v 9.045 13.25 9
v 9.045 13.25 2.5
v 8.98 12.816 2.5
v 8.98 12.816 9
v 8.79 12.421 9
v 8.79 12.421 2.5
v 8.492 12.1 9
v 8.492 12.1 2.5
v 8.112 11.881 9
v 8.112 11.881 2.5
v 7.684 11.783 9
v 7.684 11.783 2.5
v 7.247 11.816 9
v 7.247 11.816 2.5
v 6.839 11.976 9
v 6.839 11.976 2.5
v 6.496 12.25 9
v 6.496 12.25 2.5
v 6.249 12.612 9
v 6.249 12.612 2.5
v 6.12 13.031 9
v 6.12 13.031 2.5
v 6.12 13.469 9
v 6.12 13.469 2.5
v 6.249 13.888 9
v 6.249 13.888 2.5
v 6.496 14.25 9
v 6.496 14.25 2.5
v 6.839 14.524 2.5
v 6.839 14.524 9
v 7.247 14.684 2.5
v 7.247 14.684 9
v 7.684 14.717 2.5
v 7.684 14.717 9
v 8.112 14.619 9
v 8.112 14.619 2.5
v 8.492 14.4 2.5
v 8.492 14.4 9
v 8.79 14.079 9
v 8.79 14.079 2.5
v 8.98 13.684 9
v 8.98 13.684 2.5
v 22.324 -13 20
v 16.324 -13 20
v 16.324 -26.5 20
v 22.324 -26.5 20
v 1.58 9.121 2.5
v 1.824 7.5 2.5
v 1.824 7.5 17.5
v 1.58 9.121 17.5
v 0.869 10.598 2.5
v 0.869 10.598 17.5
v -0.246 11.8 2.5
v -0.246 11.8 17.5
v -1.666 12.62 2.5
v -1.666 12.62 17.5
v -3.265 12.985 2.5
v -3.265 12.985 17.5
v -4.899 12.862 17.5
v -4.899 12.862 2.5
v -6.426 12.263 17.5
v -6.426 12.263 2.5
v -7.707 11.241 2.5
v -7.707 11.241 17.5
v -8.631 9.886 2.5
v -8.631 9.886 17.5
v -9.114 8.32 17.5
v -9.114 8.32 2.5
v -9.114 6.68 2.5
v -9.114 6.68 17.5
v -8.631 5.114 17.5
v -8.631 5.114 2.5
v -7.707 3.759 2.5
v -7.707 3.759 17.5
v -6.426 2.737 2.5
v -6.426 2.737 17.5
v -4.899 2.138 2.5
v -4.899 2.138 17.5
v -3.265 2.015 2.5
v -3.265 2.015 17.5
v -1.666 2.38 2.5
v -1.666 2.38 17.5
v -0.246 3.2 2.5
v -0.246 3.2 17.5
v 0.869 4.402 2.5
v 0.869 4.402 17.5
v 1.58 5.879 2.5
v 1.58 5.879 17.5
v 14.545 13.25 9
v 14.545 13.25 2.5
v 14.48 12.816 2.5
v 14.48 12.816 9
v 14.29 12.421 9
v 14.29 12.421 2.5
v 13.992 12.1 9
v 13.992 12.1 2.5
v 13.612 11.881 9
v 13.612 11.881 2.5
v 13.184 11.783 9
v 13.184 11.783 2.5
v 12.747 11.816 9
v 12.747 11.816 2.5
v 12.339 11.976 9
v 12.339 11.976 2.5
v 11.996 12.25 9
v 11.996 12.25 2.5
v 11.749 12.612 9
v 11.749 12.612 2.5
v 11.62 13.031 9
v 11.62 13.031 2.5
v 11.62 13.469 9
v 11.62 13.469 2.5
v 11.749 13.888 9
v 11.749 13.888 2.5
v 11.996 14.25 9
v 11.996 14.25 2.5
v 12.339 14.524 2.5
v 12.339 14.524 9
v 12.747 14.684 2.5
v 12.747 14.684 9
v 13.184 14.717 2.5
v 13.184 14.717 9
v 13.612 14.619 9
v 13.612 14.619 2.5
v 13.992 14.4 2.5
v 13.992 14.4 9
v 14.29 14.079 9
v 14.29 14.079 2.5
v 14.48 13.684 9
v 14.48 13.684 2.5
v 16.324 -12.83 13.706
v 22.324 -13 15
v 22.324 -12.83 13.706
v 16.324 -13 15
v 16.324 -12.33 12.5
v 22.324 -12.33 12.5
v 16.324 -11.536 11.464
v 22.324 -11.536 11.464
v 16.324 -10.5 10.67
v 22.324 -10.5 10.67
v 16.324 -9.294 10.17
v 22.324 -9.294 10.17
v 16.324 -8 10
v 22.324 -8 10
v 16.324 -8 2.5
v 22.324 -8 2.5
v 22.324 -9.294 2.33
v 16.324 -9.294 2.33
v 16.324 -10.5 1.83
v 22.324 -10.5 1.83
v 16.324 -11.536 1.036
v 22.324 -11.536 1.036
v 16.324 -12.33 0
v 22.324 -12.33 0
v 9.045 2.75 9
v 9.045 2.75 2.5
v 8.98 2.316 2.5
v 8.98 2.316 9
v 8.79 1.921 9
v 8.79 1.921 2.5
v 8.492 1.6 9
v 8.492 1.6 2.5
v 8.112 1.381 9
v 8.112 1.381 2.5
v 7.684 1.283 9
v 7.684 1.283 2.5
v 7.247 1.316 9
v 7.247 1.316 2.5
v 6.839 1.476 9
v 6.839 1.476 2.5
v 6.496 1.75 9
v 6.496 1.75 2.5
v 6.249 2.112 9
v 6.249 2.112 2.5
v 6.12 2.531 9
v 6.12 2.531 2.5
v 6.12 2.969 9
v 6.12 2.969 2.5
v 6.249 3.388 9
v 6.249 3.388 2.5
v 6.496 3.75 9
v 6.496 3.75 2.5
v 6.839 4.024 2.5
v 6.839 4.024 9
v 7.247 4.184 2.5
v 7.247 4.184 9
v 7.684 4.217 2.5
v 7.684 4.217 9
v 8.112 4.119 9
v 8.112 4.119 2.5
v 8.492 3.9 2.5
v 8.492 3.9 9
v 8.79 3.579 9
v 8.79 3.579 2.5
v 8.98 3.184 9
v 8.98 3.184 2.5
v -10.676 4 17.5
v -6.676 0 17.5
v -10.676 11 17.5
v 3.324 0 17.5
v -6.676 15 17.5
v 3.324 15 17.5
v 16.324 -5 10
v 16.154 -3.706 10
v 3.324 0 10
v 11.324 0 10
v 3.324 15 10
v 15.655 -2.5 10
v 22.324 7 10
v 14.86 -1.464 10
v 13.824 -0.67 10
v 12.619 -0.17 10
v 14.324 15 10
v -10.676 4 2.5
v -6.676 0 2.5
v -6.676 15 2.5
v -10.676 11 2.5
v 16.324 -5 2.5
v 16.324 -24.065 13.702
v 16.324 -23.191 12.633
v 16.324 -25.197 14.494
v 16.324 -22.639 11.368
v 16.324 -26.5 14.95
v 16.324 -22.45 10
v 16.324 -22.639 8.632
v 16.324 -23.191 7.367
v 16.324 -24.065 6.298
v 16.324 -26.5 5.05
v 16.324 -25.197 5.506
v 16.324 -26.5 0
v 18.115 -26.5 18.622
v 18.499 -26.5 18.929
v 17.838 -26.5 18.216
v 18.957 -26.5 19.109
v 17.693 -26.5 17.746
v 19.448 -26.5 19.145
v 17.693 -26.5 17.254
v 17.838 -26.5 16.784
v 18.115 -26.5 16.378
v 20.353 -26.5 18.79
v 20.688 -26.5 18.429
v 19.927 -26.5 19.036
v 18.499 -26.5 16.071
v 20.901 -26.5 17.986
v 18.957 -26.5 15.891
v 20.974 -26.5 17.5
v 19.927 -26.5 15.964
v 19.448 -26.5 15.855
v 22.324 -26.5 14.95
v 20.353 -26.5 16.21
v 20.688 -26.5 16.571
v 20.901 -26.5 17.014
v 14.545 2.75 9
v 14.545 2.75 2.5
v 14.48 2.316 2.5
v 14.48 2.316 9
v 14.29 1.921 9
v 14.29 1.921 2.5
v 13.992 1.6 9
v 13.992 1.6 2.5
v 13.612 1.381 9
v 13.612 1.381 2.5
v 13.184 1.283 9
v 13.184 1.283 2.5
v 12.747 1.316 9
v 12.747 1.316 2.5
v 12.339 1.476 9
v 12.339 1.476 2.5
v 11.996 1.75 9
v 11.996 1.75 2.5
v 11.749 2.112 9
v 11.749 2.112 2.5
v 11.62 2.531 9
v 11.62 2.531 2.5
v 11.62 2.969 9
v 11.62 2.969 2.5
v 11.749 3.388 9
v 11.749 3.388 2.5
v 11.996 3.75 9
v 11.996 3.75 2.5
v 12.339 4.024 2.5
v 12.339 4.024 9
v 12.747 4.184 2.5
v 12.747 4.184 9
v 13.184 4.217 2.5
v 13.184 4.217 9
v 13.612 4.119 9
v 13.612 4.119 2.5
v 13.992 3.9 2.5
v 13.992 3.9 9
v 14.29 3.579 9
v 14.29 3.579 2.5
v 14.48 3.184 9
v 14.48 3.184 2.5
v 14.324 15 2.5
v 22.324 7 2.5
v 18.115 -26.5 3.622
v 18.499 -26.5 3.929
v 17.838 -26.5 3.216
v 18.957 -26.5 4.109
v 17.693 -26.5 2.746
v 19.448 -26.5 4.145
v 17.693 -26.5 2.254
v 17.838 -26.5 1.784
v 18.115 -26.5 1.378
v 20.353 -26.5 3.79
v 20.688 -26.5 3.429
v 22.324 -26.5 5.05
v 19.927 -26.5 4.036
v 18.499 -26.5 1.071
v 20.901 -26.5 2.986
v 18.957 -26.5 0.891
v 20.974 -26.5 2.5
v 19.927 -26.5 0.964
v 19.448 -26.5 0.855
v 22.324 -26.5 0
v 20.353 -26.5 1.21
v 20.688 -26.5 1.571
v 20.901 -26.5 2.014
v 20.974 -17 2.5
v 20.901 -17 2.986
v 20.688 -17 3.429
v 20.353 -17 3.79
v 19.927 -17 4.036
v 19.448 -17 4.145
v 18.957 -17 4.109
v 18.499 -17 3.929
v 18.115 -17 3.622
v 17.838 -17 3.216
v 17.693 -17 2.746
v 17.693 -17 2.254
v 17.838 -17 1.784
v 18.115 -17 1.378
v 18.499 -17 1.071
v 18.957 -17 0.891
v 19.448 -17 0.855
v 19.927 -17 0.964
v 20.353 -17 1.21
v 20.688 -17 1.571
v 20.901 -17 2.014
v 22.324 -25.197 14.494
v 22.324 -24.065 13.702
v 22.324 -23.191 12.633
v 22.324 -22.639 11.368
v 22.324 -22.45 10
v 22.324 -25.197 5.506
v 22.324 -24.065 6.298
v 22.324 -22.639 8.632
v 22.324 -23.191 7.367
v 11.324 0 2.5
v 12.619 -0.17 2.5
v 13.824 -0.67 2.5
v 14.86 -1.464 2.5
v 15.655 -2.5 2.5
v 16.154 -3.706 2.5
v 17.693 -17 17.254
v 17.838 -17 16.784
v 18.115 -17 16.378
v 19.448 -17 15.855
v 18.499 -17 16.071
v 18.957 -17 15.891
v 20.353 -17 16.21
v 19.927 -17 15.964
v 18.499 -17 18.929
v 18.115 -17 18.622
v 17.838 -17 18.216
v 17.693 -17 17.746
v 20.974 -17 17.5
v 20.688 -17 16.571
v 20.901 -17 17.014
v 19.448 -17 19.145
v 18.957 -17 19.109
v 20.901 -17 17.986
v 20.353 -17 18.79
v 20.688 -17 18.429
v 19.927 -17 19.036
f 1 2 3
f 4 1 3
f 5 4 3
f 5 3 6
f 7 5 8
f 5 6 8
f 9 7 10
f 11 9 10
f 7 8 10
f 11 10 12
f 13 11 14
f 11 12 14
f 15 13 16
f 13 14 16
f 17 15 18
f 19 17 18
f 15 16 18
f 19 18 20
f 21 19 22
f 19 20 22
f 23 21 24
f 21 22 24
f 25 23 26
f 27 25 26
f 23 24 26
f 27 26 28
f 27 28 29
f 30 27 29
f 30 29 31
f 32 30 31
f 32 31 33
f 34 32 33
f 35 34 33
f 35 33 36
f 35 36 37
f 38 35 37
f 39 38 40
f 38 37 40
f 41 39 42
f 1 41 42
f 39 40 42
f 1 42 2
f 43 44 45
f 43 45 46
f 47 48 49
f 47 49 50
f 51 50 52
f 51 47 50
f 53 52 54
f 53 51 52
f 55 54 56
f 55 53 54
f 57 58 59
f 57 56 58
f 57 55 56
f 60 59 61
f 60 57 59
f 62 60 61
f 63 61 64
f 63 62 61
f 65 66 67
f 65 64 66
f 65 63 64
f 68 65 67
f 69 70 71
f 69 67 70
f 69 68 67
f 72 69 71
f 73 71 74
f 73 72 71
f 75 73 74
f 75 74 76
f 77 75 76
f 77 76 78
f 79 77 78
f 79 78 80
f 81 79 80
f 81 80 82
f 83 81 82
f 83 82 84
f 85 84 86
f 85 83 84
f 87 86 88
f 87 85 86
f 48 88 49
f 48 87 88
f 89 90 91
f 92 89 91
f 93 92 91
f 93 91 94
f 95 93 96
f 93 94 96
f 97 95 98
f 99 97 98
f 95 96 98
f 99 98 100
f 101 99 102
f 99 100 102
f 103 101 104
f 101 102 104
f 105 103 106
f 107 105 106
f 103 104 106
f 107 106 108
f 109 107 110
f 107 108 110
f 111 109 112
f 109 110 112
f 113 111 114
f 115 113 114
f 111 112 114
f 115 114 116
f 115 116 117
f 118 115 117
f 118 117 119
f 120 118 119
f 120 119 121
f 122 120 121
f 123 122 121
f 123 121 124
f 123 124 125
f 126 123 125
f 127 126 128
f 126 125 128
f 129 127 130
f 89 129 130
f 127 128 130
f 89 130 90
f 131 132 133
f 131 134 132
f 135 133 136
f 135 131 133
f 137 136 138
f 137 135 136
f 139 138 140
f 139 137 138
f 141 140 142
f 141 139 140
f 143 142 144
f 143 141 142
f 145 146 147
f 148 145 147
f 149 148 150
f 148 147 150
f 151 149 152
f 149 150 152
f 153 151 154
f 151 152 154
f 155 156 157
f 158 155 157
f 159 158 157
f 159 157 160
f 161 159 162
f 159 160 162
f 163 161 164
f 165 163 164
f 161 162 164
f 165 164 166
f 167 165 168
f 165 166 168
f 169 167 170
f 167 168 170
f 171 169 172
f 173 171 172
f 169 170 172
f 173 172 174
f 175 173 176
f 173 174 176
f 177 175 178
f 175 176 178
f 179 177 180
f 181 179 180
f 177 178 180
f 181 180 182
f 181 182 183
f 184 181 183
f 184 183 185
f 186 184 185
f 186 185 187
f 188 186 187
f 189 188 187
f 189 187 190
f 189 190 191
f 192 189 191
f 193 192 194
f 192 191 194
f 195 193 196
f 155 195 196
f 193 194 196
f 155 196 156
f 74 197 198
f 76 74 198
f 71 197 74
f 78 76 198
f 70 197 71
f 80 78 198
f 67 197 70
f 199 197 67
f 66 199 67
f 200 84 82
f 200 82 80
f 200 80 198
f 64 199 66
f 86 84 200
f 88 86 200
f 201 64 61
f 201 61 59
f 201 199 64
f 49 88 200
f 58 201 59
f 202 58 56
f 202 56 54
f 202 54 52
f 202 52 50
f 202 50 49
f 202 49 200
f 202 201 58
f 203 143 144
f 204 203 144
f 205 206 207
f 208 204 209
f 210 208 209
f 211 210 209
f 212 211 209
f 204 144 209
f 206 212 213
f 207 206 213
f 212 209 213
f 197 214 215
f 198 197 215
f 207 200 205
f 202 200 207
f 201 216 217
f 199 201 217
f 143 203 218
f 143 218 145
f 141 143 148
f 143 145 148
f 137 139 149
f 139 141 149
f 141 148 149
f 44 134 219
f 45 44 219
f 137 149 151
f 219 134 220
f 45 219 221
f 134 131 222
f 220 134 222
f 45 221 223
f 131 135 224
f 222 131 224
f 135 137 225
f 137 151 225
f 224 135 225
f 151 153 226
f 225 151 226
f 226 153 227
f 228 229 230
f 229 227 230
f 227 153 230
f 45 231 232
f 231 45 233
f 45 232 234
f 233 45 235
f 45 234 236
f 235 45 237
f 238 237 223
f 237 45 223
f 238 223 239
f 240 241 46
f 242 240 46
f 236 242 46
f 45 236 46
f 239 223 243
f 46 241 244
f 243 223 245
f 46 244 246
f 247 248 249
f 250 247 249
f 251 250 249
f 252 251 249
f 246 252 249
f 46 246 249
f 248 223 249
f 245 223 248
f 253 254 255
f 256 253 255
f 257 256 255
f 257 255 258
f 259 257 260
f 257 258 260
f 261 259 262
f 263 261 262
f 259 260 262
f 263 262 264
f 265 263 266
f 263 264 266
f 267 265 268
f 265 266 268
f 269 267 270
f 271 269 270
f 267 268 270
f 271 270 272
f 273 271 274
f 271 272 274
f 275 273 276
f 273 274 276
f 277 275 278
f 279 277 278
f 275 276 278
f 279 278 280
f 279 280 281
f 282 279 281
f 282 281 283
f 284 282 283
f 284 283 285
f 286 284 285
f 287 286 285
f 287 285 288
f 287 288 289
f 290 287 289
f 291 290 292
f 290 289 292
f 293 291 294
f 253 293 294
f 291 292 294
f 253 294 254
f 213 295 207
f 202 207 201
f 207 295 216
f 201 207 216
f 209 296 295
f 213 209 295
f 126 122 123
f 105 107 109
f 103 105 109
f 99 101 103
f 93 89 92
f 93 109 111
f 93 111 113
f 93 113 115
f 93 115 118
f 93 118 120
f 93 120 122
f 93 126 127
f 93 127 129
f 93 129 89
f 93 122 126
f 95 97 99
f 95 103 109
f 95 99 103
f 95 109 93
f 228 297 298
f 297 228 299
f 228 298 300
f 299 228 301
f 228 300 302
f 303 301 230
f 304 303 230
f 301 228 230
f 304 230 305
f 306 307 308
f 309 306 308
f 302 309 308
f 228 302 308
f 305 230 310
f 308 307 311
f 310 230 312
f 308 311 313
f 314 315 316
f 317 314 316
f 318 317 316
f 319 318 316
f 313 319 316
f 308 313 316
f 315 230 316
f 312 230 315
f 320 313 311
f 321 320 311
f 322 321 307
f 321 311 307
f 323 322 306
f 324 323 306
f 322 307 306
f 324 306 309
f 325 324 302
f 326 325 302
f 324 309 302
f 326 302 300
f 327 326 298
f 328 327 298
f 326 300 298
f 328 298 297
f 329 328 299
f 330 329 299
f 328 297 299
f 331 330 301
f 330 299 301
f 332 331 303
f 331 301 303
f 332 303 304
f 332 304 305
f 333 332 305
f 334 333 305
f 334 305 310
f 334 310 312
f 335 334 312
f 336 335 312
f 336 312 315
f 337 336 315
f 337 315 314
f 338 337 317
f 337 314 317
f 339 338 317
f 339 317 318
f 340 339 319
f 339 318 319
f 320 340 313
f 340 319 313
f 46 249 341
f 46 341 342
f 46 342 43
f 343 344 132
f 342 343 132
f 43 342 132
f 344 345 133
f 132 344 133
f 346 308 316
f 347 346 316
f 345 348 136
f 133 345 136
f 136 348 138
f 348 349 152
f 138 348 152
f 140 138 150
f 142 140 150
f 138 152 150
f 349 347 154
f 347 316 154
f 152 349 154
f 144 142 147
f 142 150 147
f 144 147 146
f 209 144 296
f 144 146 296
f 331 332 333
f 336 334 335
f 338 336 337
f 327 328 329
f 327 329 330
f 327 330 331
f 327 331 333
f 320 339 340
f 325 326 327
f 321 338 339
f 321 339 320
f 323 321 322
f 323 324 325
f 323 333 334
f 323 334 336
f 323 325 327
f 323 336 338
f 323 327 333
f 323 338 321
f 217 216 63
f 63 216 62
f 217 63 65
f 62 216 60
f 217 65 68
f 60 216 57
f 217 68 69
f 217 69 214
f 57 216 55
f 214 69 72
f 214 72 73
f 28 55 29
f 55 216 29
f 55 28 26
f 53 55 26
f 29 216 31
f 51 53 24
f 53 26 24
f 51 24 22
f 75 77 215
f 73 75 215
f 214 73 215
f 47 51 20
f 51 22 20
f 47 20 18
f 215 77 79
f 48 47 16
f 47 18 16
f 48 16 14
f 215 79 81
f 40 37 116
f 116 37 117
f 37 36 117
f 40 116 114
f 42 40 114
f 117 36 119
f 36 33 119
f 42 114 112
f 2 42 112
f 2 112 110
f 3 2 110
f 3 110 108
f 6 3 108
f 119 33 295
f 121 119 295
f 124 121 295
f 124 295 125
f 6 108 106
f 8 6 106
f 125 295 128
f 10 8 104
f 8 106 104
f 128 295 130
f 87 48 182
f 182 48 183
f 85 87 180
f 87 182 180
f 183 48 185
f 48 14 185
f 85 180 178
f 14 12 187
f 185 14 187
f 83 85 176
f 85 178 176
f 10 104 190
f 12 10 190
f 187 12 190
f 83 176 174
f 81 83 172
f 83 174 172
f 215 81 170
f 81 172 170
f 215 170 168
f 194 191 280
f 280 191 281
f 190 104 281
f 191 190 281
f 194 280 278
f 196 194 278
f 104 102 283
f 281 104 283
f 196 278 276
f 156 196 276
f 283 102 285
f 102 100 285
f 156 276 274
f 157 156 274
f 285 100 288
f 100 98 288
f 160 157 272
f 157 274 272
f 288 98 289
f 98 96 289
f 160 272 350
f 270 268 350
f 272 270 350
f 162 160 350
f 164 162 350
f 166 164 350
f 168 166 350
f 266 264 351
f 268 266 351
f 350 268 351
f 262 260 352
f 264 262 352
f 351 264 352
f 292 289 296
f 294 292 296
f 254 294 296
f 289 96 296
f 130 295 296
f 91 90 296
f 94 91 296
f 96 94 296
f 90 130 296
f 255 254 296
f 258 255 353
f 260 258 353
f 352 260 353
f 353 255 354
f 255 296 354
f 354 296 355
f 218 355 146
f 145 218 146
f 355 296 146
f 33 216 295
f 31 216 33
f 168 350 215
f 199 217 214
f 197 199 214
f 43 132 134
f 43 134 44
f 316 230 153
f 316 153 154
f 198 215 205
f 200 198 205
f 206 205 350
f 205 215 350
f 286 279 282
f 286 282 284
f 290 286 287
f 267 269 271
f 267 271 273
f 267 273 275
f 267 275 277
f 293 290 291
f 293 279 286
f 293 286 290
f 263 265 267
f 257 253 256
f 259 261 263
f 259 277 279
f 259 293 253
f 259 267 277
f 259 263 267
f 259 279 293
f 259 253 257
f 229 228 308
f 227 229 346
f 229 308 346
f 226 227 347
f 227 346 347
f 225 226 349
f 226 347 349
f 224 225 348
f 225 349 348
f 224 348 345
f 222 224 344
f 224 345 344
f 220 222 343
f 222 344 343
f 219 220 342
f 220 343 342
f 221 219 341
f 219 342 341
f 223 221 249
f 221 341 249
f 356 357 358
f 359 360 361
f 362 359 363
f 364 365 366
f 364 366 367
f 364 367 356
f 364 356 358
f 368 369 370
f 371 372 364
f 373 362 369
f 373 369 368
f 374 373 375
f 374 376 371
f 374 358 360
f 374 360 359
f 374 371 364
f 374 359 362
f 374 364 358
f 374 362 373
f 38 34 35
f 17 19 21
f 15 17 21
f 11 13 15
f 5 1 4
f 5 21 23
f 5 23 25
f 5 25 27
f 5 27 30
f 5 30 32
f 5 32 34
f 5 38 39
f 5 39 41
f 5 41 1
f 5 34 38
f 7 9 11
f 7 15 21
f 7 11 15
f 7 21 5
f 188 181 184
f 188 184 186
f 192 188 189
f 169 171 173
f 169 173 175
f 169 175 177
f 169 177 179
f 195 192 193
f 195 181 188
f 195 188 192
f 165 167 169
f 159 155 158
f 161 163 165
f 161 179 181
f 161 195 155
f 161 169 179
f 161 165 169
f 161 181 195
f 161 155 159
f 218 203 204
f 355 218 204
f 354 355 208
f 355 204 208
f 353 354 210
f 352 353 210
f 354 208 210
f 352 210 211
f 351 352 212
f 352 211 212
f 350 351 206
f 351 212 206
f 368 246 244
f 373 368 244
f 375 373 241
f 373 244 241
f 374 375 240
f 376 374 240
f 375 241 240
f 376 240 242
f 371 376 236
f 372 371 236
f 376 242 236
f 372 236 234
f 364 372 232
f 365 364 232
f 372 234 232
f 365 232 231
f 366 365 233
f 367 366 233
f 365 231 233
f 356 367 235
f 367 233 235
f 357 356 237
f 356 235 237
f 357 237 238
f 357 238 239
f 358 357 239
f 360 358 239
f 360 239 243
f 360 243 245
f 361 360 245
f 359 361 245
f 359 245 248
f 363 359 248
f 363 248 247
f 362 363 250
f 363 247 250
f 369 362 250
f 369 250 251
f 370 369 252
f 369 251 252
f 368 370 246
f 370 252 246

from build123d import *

# Parameters (mm, degrees)
F0_R      = 5.5
F1_DEPTH  = 20
F2_R      = 5
F3_W      = 28
F3_H      = 10
F4_DEPTH  = 19
F5_W      = 14
F5_H      = 15
F6_DEPTH  = 2.5
F7_R      = 5
F8_R      = 5.05
F9_DEPTH  = 33
F10_R     = 1.65
F11_DEPTH = 9.5
F12_R     = 1.470884
F13_DEPTH = 6.5


with BuildPart() as f1:
    # F0 (on Top) → F1 (new body)
    with BuildSketch(Plane.XY):
        Polygon((22.324427, -26.5), (22.324427, 7), (14.324427, 15), (-6.675573, 15), (-10.675573, 11), (-10.675573, 4), (-6.675573, 0), (16.324427, 0), (16.324427, -26.5), align=None)
        with Locations((-3.675573, 7.5)):
            Circle(F0_R, mode=Mode.SUBTRACT)
    extrude(amount=F1_DEPTH)

    # F2
    f2_edges = [f1.edges().sort_by_distance(p)[0] for p in [
        (16.324427, 0, 10),
    ]]
    fillet(f2_edges, radius=F2_R)

    # F3 (on face) → F4 (cut)
    with BuildSketch(Plane.YZ.offset(22.324427)):
        with Locations((1, 15)):
            Rectangle(F3_W, F3_H)
    extrude(amount=-F4_DEPTH, mode=Mode.SUBTRACT)

    # F5 (on face) → F6 (cut)
    with BuildSketch(Plane.XY.offset(20)):
        with Locations((-3.675573, 7.5)):
            Rectangle(F5_W, F5_H)
    extrude(amount=-F6_DEPTH, mode=Mode.SUBTRACT)

    # F7
    f7_edges = [f1.edges().sort_by_distance(p)[0] for p in [
        (19.324427, -13, 10),
    ]]
    fillet(f7_edges, radius=F7_R)

    # F8 (on face) → F9 (cut)
    with BuildSketch(Plane.YZ.offset(22.324427)):
        with BuildLine():
            Line((-13, -2.5), (-13, -12.279106))
            Line((-13, -12.279106), (27.693347, -12.279106))
            Line((27.693347, -12.279106), (27.693347, 2.5))
            Line((27.693347, 2.5), (-8, 2.5))
            ThreePointArc((-8, 2.5), (-11.535534, 1.035534), (-13, -2.5))
        make_face()
        with Locations((-27.5, 10)):
            Circle(F8_R)
    extrude(amount=-F9_DEPTH, mode=Mode.SUBTRACT)

    # F10 (on face) → F11 (cut)
    with BuildSketch(Plane.XZ.offset(26.5)):
        with Locations((19.324427, 17.5)):
            Circle(F10_R)
        with Locations((19.324427, 2.5)):
            Circle(F10_R)
    extrude(amount=-F11_DEPTH, mode=Mode.SUBTRACT)

    # F12 (on face) → F13 (cut)
    with BuildSketch(Plane(origin=(0, 0, 2.5), x_dir=(1, 0, 0), z_dir=(0, 0, -1))):
        with Locations((7.574427, -2.75)):
            Circle(F12_R)
        with Locations((7.574427, -13.25)):
            Circle(F12_R)
        with Locations((13.074427, -2.75)):
            Circle(F12_R)
        with Locations((13.074427, -13.25)):
            Circle(F12_R)
    extrude(amount=-F13_DEPTH, mode=Mode.SUBTRACT)


solid = f1.part
